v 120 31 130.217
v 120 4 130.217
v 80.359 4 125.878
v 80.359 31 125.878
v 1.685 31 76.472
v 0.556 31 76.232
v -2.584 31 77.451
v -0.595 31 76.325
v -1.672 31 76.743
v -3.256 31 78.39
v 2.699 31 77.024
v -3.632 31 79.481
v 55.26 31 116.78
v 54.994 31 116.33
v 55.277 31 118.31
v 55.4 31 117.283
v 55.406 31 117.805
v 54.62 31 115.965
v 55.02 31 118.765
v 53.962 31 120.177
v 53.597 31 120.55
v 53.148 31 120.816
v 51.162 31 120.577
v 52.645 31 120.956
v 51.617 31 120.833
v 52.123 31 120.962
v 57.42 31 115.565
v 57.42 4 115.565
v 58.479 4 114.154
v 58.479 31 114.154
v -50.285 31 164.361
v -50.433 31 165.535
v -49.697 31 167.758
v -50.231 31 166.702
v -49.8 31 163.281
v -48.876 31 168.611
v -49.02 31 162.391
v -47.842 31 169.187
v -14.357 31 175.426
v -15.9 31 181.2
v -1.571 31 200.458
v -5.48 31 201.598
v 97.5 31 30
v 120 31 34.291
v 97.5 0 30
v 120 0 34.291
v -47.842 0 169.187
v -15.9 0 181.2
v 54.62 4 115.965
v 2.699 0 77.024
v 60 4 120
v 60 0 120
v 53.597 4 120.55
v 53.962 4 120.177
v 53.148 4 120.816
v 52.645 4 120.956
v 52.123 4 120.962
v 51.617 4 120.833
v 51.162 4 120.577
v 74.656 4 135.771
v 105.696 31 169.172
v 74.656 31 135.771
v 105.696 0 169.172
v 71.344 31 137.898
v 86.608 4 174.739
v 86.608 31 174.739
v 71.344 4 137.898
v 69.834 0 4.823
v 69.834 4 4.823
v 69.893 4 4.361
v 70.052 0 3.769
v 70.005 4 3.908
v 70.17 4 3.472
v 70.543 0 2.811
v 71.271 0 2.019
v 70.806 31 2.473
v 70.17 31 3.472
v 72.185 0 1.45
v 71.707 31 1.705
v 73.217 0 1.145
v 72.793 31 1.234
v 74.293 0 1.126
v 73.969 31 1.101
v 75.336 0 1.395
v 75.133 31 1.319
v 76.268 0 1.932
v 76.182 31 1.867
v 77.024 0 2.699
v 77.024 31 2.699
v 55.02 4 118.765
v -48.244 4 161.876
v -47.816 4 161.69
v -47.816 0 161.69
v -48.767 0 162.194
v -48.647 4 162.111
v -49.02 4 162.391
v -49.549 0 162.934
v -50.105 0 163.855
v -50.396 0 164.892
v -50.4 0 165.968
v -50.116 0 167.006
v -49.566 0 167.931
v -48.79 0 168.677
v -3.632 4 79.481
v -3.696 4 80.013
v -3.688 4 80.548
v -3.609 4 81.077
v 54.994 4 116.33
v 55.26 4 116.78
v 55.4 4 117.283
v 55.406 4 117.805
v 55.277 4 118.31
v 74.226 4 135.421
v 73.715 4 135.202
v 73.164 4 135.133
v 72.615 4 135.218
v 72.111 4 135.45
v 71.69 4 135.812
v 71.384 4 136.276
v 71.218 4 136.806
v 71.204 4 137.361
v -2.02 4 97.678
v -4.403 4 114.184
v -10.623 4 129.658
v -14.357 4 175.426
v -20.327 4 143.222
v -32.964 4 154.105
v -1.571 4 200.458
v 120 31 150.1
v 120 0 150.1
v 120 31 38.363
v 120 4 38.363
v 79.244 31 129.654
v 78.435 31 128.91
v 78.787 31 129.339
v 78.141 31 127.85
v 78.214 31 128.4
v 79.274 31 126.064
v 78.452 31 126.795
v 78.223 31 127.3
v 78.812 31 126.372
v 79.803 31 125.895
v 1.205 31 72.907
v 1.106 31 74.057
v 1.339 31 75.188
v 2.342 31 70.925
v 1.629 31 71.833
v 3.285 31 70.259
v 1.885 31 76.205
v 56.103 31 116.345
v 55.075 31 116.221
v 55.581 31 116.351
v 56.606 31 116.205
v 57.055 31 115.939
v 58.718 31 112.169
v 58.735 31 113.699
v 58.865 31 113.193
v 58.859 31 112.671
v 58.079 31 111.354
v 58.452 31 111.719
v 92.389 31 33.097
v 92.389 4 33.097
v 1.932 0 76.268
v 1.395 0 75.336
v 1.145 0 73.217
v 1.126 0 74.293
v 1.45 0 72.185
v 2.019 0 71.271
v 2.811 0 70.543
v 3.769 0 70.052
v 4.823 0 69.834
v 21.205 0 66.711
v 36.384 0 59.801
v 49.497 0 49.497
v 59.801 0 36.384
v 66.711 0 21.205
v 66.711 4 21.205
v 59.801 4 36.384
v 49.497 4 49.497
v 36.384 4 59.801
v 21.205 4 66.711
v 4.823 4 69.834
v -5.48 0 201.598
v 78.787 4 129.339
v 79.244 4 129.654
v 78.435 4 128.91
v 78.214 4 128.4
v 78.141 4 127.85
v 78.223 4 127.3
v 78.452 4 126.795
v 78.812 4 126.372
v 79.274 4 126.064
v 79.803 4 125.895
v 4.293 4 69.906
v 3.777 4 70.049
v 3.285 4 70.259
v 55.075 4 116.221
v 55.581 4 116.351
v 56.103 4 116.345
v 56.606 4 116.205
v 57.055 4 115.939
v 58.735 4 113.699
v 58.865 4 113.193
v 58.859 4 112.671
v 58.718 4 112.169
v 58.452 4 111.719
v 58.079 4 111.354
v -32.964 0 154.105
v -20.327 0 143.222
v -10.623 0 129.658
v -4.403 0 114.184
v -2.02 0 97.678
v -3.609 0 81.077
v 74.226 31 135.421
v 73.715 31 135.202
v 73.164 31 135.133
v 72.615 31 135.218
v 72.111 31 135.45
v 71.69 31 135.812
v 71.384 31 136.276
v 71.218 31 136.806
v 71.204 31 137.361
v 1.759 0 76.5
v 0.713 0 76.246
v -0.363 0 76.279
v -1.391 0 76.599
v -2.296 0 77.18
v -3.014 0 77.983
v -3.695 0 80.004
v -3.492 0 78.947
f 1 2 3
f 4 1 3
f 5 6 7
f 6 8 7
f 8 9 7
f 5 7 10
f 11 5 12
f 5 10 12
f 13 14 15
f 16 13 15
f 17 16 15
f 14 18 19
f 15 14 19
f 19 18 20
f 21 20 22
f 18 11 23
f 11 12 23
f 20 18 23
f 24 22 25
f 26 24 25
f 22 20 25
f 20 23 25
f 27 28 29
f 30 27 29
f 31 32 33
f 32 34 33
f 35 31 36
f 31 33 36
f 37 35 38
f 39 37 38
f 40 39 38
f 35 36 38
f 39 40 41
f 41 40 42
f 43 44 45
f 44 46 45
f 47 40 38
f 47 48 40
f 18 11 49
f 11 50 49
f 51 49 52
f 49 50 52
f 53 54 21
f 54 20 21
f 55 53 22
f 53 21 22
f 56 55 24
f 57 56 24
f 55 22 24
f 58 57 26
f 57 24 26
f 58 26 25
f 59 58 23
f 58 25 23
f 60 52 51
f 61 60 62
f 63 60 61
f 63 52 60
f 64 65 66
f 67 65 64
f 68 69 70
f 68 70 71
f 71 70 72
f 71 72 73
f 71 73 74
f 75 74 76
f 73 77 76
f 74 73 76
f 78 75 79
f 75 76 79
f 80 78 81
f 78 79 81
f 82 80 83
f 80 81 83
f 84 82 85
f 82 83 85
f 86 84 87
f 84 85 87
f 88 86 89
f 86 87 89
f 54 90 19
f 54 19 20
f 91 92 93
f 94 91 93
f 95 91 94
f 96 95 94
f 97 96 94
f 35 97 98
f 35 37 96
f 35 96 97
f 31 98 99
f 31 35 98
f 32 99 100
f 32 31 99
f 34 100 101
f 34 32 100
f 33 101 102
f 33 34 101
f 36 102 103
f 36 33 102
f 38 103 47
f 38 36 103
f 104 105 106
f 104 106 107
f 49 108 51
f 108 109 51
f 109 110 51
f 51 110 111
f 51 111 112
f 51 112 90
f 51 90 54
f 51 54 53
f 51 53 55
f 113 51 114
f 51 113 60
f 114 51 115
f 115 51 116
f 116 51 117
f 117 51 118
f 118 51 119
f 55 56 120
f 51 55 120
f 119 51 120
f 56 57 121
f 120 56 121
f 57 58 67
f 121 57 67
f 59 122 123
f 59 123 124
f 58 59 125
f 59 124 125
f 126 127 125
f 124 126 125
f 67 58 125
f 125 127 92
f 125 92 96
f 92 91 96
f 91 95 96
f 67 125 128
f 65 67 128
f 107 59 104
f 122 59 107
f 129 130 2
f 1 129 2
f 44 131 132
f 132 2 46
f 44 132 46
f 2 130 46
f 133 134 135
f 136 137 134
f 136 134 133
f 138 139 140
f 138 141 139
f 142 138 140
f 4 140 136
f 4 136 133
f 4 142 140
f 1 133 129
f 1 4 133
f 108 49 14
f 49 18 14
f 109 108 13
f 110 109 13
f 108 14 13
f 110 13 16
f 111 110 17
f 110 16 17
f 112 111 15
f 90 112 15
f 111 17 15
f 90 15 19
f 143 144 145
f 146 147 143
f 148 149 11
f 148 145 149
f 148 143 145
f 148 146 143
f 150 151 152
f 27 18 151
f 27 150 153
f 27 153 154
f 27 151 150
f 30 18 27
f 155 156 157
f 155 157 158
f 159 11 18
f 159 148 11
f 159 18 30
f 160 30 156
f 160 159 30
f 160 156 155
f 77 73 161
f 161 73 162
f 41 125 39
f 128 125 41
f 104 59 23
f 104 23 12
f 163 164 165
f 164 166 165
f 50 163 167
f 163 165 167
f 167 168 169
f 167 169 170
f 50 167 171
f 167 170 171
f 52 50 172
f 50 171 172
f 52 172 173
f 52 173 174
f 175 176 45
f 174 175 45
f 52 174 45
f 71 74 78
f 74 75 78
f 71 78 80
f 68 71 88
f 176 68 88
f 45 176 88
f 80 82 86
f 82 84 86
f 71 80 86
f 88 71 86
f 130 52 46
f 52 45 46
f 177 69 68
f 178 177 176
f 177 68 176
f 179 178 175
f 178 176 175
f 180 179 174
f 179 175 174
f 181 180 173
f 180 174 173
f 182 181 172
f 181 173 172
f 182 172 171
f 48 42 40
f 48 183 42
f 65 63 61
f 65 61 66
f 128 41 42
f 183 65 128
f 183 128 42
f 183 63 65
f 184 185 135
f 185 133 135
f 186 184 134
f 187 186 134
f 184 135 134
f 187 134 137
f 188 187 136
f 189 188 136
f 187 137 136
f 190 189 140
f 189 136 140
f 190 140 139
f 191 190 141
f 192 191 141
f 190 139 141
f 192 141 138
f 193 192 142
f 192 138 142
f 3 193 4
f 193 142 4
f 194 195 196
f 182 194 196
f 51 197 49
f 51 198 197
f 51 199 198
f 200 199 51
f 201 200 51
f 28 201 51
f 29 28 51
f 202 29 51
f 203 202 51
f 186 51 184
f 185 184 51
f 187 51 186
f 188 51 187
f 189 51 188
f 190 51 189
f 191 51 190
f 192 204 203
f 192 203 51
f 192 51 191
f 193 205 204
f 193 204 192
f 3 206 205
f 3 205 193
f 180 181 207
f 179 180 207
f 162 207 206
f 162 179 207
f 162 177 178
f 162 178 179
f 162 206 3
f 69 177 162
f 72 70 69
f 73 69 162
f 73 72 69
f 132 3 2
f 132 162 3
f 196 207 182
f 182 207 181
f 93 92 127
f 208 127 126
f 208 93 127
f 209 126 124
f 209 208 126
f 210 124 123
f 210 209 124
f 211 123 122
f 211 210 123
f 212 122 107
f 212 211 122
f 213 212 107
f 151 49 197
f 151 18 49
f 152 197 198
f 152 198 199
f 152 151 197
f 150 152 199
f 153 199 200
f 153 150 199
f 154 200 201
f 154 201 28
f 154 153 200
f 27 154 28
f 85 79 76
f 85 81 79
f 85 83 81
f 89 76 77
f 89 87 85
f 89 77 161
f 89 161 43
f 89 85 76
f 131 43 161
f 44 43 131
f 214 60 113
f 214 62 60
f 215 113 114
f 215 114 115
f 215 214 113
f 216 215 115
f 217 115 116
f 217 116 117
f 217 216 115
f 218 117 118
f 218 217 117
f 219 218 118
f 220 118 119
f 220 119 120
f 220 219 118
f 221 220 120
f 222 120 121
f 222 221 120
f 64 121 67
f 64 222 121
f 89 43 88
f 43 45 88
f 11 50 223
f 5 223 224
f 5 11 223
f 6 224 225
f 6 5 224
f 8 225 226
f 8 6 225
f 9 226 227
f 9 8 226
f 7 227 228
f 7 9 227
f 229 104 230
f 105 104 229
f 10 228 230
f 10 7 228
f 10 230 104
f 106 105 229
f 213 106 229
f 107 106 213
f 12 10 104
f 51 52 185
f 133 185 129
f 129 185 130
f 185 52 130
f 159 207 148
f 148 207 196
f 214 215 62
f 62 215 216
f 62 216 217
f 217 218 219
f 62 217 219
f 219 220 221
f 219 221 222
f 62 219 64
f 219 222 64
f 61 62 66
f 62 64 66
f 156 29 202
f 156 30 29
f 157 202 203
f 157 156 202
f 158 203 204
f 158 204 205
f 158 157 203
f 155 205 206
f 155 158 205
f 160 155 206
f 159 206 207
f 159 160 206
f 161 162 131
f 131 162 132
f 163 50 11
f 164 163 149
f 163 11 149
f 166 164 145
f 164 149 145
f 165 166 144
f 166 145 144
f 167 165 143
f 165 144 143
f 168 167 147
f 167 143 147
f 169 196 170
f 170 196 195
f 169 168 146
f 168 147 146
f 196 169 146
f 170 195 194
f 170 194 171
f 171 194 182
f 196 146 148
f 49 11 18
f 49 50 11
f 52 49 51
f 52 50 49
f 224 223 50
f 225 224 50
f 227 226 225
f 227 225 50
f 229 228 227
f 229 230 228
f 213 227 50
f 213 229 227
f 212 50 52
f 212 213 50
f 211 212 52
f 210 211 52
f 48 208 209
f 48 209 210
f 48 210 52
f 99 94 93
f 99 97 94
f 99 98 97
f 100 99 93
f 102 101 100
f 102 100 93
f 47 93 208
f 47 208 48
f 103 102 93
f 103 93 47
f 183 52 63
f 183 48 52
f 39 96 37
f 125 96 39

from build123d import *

# Parameters (mm, degrees)
EXTRUDE_1_DEPTH = 4
EXTRUDE_2_DEPTH = 27
FILLET_1_R      = 4
FILLET_2_R      = 2
FILLET_3_R      = 2


with BuildPart() as part:
    # Sketch 1 → Extrude 1 (new body)
    with BuildSketch(Plane(origin=(0, 0, 0), x_dir=(1, 0, 0), z_dir=(0, 1, 0))):
        with BuildLine():
            Line((-7.155589796286023, -69.6333076527855), (60, -120.00000000000001))
            Line((60, -120.00000000000001), (120.00000000000001, -150.10000000000002))
            Line((120.00000000000003, -150.10000000000002), (120, -34.29118010291478))
            Line((120, -34.29118010291478), (97.49999999999999, -30))
            Line((97.49999999999973, -30.000000000000192), (69.63330765278488, 7.1555897962855965))
            ThreePointArc((69.63330765278421, 7.155589796285523), (49.49747468305834, -49.497474683058314), (-7.155589796285488, -69.63330765278421))
        make_face()
    extrude(amount=EXTRUDE_1_DEPTH)

    # Sketch 3 → Extrude 2 (add)
    with BuildSketch(Plane(origin=(0, 4, 0), x_dir=(1, 0, 0), z_dir=(0, 1, 0))):
        with BuildLine():
            Line((120, -38.36327790348432), (120, -34.29118010291478))
            Line((120, -34.29118010291478), (97.5, -30))
            Line((97.49999999999973, -30.000000000000192), (69.63330765278488, 7.1555897962855965))
            ThreePointArc((69.63330765278421, 7.155589796285523), (69.97119240426343, 2.008042212092745), (69.92907057497307, -3.150410849466339))
            Line((69.92907057497204, -3.1504108494667022), (92.38930542603698, -33.097390650886666))
            Line((92.38930542603698, -33.097390650886666), (120, -38.36327790348432))
        make_face()
        Polygon((120.00000000000001, -150.10000000000002), (120.00000000000001, -130.2165964036135), (69.3067853264993, -124.66890397212713), align=None)
        with BuildLine():
            Line((59.67888894248035, -112.55416992559029), (2.8619555615955647, -69.94146988992675))
            ThreePointArc((2.861955561595763, -69.9414698899262), (-2.1523393613519746, -69.96690242731613), (-7.155589796285486, -69.63330765278421))
            Line((-7.155589796286165, -69.63330765278539), (56.220490487470755, -117.16536786560309))
            Line((56.220490487470755, -117.16536786560309), (59.67888894248035, -112.55416992559029))
        make_face()
    extrude(amount=EXTRUDE_2_DEPTH)

    # Fillet 1
    fillet_1_edges = [part.edges().sort_by_distance(p)[0] for p in [
        (-7.155589796285791, 15.5, 69.63330765278482),
        (69.63330765278454, 15.5, -7.155589796285559),
    ]]
    fillet(fillet_1_edges, radius=FILLET_1_R)

    # Fillet 2
    fillet_2_edges = [part.edges().sort_by_distance(p)[0] for p in [
        (69.3067853264993, 17.5, 124.66890397212714),
    ]]
    fillet(fillet_2_edges, radius=FILLET_2_R)

    # Fillet 3
    fillet_3_edges = [part.edges().sort_by_distance(p)[0] for p in [
        (56.220490487470755, 17.5, 117.16536786560309),
        (59.67888894248035, 17.5, 112.55416992559029),
    ]]
    fillet(fillet_3_edges, radius=FILLET_3_R)


with BuildPart() as body_2:
    # Mirror 3: mirrored copy
    add(part.part.mirror(Plane(origin=(-36.00000000000001, 4, 48.00000000000002), x_dir=(0.8, 0, 0.6), z_dir=(-0.5999999999999999, 0, 0.8))))


solid = Compound([part.part, body_2.part])
